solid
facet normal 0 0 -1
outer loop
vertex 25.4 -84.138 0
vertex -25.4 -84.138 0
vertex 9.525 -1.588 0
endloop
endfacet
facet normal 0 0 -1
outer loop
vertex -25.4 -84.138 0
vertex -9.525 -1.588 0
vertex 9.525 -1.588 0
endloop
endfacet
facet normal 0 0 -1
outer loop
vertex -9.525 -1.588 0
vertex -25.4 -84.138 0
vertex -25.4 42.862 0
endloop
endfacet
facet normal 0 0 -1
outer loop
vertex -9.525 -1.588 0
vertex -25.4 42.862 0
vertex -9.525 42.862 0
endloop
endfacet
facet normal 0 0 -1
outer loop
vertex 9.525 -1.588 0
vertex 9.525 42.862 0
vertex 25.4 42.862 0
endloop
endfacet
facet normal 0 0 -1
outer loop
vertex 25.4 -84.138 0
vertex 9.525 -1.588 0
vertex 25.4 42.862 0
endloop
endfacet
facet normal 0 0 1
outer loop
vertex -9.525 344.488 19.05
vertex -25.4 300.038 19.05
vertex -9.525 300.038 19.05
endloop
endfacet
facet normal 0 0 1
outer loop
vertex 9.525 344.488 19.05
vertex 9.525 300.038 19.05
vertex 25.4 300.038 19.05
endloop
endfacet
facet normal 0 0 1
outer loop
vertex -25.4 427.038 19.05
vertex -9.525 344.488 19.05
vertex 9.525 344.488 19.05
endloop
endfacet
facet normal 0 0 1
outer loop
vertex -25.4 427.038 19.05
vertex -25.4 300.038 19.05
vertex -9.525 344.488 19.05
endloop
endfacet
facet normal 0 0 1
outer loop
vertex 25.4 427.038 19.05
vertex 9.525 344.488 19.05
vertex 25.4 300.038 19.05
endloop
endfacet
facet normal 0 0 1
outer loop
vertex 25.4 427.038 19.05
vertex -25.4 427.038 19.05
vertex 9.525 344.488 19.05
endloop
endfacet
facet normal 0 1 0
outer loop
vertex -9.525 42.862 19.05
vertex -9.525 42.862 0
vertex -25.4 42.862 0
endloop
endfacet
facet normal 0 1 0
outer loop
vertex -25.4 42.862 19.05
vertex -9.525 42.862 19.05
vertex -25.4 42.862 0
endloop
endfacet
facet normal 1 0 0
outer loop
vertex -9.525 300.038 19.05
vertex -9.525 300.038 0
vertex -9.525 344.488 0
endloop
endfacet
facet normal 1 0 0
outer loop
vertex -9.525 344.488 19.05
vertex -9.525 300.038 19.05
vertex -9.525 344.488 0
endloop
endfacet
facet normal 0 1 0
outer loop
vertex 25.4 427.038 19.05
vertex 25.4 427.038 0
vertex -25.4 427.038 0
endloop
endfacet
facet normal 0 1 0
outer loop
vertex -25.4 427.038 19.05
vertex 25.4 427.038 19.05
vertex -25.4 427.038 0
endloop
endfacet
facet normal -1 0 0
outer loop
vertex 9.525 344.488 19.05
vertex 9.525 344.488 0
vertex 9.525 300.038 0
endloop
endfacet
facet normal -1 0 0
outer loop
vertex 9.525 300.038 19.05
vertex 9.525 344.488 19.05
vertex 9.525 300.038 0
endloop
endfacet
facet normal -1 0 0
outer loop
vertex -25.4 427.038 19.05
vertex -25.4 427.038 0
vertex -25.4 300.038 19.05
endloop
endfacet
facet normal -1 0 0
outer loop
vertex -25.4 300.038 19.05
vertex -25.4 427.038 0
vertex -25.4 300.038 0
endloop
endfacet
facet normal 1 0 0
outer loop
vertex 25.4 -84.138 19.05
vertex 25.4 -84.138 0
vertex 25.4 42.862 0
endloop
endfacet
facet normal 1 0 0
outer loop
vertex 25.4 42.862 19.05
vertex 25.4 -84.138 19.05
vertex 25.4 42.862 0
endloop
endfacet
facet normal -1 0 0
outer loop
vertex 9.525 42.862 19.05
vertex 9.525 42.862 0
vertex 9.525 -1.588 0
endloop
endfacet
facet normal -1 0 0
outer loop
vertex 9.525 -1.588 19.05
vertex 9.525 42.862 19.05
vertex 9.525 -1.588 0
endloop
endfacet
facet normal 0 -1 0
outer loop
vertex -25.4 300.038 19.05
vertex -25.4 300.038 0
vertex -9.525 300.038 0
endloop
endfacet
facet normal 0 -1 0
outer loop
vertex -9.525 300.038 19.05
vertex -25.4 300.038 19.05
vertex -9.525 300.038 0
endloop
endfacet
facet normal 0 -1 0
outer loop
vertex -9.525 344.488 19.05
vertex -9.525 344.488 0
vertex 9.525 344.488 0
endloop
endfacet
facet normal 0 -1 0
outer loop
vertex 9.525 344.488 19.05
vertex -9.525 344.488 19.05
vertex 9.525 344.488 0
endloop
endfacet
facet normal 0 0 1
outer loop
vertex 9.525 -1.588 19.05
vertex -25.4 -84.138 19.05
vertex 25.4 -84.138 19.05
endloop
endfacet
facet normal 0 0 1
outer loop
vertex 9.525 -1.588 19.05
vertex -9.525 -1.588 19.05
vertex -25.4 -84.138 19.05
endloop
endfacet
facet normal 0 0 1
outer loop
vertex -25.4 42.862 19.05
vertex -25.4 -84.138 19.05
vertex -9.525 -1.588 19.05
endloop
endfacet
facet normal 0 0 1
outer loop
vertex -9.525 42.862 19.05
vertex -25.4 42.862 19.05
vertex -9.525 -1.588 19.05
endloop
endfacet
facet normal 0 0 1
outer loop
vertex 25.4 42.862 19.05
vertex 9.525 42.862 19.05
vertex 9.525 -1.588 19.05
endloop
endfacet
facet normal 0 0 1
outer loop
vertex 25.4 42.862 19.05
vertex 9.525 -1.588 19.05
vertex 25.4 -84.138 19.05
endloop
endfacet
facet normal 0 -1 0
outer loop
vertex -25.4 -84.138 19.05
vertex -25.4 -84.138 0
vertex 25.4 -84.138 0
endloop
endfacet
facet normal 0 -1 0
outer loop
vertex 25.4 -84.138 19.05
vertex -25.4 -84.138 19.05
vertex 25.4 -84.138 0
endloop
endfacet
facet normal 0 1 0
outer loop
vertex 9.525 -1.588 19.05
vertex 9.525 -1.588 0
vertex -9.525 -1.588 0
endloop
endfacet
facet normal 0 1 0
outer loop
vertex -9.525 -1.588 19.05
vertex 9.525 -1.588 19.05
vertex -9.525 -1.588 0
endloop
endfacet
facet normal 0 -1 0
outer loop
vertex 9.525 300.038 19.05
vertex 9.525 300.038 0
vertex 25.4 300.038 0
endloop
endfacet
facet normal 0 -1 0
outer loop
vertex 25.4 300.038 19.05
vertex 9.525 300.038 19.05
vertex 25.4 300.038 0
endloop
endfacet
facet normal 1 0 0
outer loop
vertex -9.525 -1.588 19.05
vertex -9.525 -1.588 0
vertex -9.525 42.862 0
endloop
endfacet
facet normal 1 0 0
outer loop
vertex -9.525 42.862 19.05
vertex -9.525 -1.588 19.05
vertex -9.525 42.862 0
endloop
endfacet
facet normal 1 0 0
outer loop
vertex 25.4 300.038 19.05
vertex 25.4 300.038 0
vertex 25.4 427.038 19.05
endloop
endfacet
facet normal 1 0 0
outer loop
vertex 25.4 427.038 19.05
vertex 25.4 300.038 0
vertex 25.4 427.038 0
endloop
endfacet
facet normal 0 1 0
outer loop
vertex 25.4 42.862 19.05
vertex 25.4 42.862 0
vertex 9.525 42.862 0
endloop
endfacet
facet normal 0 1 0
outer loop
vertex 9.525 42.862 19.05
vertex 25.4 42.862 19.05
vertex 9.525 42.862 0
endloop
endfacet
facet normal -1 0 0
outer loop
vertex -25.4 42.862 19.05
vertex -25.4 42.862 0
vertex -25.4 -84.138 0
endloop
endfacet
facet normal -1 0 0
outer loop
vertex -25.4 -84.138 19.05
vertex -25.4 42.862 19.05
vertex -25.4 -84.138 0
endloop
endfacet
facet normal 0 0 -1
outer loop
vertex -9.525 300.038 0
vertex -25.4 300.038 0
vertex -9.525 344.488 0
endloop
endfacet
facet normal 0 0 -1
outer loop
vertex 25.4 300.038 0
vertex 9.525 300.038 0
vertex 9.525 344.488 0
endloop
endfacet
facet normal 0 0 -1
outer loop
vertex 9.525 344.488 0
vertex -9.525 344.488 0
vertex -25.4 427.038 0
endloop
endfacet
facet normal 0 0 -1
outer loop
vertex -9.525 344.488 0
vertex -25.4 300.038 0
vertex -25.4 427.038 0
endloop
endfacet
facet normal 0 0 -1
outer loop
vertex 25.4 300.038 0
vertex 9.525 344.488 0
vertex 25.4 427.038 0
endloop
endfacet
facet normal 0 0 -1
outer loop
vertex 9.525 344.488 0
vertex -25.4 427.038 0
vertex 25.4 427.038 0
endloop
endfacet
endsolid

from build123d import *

# Parameters (mm, degrees)
F1_DEPTH = 19.05


with BuildPart() as f1:
    # F0 (on Top) → F1 (new body)
    with BuildSketch(Plane.XY):
        Polygon((-25.4, 42.8625), (-25.4, -84.1375), (25.4, -84.1375), (25.4, 42.8625), (9.525, 42.8625), (9.525, -1.5875), (-9.525, -1.5875), (-9.525, 42.8625), align=None)
        Polygon((9.525, 300.0375), (25.4, 300.0375), (25.4, 427.0375), (-25.4, 427.0375), (-25.4, 300.0375), (-9.525, 300.0375), (-9.525, 344.4875), (9.525, 344.4875), align=None)
    extrude(amount=F1_DEPTH)


solid = f1.part
